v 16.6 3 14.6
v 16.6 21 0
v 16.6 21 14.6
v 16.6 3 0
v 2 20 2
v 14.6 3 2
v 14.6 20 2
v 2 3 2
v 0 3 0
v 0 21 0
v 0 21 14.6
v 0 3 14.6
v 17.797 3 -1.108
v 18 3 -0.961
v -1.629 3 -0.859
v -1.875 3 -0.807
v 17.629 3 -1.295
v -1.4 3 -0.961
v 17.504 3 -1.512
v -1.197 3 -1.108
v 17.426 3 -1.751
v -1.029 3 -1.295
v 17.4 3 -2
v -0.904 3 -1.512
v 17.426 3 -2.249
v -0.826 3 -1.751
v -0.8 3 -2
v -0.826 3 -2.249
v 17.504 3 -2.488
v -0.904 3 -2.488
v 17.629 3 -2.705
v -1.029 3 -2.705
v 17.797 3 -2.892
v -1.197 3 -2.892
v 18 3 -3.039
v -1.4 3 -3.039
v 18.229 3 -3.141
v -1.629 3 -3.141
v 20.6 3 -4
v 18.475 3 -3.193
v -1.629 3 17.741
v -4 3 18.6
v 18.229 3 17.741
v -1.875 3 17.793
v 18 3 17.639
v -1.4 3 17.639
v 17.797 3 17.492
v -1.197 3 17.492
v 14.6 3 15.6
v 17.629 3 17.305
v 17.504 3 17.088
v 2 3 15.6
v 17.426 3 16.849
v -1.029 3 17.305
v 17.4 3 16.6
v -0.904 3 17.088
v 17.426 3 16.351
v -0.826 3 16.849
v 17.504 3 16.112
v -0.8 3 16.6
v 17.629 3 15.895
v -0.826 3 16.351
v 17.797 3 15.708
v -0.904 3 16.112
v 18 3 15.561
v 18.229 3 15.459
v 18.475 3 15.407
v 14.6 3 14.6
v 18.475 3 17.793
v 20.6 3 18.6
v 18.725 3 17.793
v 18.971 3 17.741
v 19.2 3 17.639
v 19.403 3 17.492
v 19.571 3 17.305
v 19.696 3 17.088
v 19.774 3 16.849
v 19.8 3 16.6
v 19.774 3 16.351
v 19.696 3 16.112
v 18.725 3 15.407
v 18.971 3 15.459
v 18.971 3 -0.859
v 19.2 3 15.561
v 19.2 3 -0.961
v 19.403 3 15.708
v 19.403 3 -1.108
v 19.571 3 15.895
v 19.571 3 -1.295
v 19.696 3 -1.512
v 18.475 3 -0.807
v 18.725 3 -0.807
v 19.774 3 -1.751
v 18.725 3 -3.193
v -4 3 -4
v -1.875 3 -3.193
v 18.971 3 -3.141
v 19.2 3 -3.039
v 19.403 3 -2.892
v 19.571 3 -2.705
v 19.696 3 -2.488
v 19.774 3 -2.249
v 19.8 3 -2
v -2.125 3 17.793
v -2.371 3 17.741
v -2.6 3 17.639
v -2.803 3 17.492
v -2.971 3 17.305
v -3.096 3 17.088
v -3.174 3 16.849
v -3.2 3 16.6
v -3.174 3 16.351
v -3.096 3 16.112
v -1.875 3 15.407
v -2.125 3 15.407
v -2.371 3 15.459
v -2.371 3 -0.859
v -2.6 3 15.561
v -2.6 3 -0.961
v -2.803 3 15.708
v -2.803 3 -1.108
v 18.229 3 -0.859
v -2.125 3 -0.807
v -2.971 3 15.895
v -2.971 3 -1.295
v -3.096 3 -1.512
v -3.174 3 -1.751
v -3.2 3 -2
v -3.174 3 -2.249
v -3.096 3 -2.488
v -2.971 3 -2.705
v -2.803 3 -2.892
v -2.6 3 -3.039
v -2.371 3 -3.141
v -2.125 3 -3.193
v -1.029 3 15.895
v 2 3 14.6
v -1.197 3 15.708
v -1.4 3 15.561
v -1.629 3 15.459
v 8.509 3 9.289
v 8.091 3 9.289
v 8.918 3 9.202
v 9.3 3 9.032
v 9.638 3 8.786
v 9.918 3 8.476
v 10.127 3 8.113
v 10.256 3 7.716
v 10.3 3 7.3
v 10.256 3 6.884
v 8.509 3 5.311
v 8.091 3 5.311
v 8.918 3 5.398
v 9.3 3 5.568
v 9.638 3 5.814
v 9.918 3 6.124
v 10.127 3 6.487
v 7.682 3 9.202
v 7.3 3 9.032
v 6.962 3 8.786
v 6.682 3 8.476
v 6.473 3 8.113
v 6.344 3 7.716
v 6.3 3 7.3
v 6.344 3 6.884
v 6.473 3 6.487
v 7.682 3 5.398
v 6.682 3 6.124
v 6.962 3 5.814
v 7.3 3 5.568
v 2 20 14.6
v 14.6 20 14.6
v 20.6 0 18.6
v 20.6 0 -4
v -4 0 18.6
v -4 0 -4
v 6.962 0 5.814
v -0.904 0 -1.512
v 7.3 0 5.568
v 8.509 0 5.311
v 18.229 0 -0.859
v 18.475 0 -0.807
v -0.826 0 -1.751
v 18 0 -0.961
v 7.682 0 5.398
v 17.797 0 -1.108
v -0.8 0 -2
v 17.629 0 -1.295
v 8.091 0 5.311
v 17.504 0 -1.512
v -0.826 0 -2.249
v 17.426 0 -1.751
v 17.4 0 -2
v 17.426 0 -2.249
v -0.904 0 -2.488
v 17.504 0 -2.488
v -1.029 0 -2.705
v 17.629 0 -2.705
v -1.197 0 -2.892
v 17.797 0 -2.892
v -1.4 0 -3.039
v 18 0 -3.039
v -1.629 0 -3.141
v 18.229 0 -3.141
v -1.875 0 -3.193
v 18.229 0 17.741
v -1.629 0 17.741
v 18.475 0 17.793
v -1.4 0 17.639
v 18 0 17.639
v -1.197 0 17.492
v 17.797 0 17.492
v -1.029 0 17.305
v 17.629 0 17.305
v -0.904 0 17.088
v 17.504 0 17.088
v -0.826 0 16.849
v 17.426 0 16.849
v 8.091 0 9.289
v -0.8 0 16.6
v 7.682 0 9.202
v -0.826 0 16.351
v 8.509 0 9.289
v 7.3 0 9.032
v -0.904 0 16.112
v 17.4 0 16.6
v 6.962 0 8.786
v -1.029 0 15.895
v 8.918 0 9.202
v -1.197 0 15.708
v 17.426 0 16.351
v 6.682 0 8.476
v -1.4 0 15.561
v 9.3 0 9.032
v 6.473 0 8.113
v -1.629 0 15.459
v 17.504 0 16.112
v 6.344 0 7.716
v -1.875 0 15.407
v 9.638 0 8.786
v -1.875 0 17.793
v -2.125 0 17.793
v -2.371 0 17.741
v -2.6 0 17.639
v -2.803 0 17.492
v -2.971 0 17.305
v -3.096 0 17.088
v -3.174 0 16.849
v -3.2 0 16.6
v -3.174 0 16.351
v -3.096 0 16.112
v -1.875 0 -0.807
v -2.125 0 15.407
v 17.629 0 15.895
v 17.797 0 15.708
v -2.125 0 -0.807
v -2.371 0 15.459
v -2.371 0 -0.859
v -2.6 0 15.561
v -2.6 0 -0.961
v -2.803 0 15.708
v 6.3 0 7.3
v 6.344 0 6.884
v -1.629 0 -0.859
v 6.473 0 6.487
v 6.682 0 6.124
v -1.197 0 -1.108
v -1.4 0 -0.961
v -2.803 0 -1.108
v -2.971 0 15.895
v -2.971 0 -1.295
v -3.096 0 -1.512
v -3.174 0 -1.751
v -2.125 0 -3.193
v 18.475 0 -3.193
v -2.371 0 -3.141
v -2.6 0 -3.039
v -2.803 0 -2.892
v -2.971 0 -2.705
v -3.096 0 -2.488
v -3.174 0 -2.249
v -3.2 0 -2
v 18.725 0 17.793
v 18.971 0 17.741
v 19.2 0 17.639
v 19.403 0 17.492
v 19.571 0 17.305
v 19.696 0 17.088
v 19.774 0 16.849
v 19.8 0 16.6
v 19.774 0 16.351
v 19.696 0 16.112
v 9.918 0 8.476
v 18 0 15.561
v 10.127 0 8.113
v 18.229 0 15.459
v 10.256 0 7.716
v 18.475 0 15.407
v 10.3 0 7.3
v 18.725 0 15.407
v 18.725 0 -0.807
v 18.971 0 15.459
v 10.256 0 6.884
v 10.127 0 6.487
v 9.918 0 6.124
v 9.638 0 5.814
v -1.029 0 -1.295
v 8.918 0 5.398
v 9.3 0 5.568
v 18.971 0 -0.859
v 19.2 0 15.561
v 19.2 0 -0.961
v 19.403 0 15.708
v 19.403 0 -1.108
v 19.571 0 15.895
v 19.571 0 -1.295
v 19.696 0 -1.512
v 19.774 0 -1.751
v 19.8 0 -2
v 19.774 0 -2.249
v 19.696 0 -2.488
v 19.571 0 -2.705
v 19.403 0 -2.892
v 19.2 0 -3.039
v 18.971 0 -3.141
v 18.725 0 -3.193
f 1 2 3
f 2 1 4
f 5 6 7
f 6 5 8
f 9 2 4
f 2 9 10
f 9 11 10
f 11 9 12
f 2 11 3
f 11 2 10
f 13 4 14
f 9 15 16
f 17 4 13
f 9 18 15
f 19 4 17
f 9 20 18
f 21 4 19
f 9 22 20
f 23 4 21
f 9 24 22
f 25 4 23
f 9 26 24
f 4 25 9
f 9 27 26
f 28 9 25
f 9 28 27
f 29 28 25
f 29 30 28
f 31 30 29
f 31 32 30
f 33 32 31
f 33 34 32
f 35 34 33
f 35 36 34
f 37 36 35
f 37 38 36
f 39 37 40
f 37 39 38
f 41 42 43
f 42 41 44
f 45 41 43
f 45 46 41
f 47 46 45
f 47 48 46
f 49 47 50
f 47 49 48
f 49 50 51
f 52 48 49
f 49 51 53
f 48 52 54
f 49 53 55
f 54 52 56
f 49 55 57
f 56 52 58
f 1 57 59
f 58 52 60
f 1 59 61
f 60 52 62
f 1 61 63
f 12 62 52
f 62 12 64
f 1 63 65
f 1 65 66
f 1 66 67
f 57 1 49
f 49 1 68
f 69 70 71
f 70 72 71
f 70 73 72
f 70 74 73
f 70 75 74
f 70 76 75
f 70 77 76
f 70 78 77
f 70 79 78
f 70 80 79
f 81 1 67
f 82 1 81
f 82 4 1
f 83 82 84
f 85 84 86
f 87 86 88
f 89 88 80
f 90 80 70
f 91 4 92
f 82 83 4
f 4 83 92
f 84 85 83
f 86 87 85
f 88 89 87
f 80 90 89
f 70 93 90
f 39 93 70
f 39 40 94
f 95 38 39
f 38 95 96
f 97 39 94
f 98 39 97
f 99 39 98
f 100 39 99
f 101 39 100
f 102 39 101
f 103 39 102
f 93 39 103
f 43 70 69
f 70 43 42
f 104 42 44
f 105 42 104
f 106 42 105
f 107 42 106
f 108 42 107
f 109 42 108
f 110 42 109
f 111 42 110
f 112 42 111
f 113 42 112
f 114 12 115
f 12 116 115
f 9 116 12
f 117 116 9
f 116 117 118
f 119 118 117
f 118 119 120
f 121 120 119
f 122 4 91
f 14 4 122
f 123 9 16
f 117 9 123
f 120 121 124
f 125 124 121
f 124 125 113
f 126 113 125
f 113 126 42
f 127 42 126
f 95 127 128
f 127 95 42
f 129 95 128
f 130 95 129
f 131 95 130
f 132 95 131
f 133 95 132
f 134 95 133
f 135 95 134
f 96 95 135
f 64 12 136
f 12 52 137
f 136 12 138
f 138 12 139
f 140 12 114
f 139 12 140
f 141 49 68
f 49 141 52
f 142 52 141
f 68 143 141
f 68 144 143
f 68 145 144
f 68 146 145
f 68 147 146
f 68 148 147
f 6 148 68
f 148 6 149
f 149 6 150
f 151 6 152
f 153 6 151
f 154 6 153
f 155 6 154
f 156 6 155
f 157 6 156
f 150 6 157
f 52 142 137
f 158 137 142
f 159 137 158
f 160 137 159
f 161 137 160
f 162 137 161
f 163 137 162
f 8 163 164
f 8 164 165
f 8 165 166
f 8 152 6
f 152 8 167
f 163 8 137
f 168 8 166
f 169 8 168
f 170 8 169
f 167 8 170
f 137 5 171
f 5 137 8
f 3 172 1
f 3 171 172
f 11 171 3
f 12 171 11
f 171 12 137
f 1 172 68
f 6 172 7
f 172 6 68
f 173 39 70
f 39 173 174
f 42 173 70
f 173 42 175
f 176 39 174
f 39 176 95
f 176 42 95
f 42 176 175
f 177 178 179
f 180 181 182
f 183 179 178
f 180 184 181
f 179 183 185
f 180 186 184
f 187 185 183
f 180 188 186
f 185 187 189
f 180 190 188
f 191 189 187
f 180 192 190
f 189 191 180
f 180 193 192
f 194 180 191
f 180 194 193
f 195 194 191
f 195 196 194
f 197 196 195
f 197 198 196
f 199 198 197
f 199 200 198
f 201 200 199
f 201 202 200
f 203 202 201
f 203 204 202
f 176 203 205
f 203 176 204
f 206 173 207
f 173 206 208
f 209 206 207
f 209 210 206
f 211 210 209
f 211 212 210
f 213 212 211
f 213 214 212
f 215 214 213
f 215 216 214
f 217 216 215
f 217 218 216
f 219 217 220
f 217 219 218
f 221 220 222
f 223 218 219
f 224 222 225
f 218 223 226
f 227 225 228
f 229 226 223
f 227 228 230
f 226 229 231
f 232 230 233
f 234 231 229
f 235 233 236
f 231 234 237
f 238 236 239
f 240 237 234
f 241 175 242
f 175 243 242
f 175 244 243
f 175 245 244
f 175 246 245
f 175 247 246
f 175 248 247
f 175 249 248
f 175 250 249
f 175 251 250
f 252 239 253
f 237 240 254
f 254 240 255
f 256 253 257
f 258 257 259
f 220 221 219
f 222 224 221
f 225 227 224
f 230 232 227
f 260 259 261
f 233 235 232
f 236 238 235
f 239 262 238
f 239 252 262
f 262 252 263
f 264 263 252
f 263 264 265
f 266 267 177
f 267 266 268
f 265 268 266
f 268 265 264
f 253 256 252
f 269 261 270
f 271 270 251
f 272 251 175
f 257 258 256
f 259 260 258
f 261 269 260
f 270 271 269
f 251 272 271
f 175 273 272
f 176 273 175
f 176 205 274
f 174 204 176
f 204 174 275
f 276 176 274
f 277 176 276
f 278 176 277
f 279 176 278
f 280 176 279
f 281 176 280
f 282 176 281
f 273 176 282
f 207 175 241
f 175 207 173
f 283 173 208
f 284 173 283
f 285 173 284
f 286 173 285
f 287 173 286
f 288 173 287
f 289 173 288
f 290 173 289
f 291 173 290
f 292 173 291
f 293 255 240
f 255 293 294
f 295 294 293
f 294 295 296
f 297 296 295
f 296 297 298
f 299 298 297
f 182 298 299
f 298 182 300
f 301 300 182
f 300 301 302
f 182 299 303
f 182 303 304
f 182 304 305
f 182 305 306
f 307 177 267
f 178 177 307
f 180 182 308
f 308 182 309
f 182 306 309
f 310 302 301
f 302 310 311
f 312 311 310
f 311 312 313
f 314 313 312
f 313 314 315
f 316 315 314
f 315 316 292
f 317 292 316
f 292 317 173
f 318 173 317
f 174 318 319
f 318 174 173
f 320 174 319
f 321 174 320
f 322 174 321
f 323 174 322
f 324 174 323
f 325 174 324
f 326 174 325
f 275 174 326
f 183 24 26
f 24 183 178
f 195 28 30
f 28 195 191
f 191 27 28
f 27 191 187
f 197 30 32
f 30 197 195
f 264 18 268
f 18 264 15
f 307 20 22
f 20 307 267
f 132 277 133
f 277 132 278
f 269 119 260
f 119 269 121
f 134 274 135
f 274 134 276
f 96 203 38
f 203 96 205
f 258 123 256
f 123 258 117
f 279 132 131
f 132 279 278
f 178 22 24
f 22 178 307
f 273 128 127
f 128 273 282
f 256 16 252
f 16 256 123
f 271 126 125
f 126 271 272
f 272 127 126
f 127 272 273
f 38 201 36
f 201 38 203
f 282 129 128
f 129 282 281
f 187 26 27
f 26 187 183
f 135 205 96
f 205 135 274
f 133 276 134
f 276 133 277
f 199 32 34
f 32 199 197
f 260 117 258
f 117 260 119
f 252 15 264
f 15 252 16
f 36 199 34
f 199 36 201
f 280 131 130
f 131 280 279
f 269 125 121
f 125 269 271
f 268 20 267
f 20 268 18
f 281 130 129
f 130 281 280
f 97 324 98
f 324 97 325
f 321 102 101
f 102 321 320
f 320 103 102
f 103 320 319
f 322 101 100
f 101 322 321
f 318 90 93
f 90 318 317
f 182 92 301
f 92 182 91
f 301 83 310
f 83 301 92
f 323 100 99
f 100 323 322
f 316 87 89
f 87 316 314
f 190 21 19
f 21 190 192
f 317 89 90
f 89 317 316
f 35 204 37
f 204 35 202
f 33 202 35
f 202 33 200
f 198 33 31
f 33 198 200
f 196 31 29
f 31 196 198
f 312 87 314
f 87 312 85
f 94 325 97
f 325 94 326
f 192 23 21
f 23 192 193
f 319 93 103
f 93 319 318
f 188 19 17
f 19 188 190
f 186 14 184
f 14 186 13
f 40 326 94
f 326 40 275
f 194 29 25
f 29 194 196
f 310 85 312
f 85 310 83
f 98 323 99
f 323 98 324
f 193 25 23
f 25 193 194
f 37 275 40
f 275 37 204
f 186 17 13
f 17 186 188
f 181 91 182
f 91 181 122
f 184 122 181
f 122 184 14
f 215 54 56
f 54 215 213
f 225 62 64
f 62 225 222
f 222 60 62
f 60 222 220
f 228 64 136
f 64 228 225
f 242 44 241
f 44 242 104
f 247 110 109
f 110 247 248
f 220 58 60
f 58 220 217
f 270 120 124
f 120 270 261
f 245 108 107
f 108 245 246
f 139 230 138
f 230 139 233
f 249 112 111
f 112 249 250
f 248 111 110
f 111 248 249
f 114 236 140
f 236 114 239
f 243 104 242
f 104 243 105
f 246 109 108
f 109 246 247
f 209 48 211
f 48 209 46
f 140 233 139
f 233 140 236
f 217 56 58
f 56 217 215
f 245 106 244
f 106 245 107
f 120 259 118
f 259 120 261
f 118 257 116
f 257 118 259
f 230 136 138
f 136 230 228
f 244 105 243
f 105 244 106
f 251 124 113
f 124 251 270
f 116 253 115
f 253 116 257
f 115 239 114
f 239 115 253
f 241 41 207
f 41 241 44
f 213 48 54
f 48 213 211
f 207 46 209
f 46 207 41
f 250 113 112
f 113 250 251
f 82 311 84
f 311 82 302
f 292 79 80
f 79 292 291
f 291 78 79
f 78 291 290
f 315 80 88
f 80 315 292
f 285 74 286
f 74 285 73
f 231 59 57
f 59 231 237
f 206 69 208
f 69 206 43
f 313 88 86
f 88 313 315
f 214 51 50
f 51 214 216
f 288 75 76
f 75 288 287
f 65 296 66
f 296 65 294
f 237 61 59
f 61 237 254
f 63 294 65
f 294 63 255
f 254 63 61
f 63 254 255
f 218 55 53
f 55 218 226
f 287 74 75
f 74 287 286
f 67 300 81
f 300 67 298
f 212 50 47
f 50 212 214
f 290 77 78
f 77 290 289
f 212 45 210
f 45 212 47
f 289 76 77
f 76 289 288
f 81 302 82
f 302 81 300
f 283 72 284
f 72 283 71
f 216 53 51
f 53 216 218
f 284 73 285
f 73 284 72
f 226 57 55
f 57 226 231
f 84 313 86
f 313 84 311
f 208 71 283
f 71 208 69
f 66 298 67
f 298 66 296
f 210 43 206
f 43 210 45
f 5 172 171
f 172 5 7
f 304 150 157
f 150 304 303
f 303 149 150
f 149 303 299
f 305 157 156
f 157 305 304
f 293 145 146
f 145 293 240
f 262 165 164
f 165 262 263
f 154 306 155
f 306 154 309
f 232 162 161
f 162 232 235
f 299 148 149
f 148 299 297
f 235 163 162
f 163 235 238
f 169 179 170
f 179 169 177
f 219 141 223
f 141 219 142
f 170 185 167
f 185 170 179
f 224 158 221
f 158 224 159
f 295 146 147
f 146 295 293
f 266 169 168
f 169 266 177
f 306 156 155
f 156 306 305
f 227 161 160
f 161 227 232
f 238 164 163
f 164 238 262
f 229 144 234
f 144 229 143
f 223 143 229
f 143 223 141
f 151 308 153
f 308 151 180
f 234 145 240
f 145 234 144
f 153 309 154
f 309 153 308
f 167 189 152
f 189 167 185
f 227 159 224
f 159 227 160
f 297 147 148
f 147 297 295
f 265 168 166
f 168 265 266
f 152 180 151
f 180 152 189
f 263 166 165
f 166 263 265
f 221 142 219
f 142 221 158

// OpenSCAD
// FoldIt Robot - Conveyor Motor Mount (N20 DC Gear Motor)
// Scale: 1:4
// Cradle bracket for N20 micro gear motor, mounts to belt_frame side wall
// Motor shaft aligns with rear roller axle
//
// PRINT GUIDANCE: Print flat with base plate on bed. No supports needed.

$fn = 30;

// N20 motor dimensions at 1:4 scale
motor_body_w = 12;         // motor body width
motor_body_h = 10;         // motor body height
motor_body_l = 16;         // motor body length (including gearbox)
motor_shaft_dia = 3;       // output shaft diameter
motor_shaft_offset_z = 5;  // shaft center height from motor bottom

// Bracket parameters
wall = 2;
clearance = 0.3;           // clearance around motor body
bracket_inner_w = motor_body_w + clearance * 2;
bracket_inner_h = motor_body_h + clearance * 2;
bracket_outer_w = bracket_inner_w + wall * 2;
bracket_outer_h = bracket_inner_h + wall * 2;
bracket_length = motor_body_l + wall;

// Mounting flange (attaches to belt_frame side wall)
flange_width = bracket_outer_w + 8;
flange_height = bracket_outer_h + 8;
flange_thickness = 3;

// Hardware
m2_hole = 2.4;             // M2 clearance hole
m2_spacing_w = bracket_outer_w + 4;
m2_spacing_h = bracket_outer_h + 4;

module motor_mount_conv() {
    difference() {
        union() {
            // Mounting flange
            translate([-(flange_width - bracket_outer_w) / 2,
                       0,
                       -(flange_height - bracket_outer_h) / 2])
                cube([flange_width, flange_thickness, flange_height]);

            // Motor cradle (U-shaped, open top for motor insertion)
            translate([0, flange_thickness, 0])
                _motor_cradle();
        }

        // Motor cavity
        translate([wall, flange_thickness, wall])
            cube([bracket_inner_w, motor_body_l + 1, bracket_inner_h]);

        // Open top for motor insertion
        translate([wall, flange_thickness, wall + bracket_inner_h - 1])
            cube([bracket_inner_w, motor_body_l + 1, wall + 2]);

        // Shaft pass-through hole in flange
        translate([bracket_outer_w / 2,
                   -0.5,
                   wall + clearance + motor_shaft_offset_z])
            rotate([-90, 0, 0])
                cylinder(d=motor_shaft_dia + 1, h=flange_thickness + 1);

        // M2 mounting holes in flange (4 corners)
        _flange_holes();
    }
}

module _motor_cradle() {
    // Bottom wall
    cube([bracket_outer_w, bracket_length, wall]);

    // Left wall
    cube([wall, bracket_length, bracket_outer_h]);

    // Right wall
    translate([wall + bracket_inner_w, 0, 0])
        cube([wall, bracket_length, bracket_outer_h]);

    // Back wall (motor stop)
    translate([0, bracket_length - wall, 0])
        cube([bracket_outer_w, wall, bracket_outer_h]);
}

module _flange_holes() {
    cx = bracket_outer_w / 2;
    cz = bracket_outer_h / 2;

    positions = [
        [cx - m2_spacing_w / 2, cz - m2_spacing_h / 2],
        [cx + m2_spacing_w / 2, cz - m2_spacing_h / 2],
        [cx - m2_spacing_w / 2, cz + m2_spacing_h / 2],
        [cx + m2_spacing_w / 2, cz + m2_spacing_h / 2]
    ];

    for (pos = positions) {
        translate([pos[0], -0.5, pos[1]])
            rotate([-90, 0, 0])
                cylinder(d=m2_hole, h=flange_thickness + 1);
    }
}

// Render when opened directly
motor_mount_conv();
